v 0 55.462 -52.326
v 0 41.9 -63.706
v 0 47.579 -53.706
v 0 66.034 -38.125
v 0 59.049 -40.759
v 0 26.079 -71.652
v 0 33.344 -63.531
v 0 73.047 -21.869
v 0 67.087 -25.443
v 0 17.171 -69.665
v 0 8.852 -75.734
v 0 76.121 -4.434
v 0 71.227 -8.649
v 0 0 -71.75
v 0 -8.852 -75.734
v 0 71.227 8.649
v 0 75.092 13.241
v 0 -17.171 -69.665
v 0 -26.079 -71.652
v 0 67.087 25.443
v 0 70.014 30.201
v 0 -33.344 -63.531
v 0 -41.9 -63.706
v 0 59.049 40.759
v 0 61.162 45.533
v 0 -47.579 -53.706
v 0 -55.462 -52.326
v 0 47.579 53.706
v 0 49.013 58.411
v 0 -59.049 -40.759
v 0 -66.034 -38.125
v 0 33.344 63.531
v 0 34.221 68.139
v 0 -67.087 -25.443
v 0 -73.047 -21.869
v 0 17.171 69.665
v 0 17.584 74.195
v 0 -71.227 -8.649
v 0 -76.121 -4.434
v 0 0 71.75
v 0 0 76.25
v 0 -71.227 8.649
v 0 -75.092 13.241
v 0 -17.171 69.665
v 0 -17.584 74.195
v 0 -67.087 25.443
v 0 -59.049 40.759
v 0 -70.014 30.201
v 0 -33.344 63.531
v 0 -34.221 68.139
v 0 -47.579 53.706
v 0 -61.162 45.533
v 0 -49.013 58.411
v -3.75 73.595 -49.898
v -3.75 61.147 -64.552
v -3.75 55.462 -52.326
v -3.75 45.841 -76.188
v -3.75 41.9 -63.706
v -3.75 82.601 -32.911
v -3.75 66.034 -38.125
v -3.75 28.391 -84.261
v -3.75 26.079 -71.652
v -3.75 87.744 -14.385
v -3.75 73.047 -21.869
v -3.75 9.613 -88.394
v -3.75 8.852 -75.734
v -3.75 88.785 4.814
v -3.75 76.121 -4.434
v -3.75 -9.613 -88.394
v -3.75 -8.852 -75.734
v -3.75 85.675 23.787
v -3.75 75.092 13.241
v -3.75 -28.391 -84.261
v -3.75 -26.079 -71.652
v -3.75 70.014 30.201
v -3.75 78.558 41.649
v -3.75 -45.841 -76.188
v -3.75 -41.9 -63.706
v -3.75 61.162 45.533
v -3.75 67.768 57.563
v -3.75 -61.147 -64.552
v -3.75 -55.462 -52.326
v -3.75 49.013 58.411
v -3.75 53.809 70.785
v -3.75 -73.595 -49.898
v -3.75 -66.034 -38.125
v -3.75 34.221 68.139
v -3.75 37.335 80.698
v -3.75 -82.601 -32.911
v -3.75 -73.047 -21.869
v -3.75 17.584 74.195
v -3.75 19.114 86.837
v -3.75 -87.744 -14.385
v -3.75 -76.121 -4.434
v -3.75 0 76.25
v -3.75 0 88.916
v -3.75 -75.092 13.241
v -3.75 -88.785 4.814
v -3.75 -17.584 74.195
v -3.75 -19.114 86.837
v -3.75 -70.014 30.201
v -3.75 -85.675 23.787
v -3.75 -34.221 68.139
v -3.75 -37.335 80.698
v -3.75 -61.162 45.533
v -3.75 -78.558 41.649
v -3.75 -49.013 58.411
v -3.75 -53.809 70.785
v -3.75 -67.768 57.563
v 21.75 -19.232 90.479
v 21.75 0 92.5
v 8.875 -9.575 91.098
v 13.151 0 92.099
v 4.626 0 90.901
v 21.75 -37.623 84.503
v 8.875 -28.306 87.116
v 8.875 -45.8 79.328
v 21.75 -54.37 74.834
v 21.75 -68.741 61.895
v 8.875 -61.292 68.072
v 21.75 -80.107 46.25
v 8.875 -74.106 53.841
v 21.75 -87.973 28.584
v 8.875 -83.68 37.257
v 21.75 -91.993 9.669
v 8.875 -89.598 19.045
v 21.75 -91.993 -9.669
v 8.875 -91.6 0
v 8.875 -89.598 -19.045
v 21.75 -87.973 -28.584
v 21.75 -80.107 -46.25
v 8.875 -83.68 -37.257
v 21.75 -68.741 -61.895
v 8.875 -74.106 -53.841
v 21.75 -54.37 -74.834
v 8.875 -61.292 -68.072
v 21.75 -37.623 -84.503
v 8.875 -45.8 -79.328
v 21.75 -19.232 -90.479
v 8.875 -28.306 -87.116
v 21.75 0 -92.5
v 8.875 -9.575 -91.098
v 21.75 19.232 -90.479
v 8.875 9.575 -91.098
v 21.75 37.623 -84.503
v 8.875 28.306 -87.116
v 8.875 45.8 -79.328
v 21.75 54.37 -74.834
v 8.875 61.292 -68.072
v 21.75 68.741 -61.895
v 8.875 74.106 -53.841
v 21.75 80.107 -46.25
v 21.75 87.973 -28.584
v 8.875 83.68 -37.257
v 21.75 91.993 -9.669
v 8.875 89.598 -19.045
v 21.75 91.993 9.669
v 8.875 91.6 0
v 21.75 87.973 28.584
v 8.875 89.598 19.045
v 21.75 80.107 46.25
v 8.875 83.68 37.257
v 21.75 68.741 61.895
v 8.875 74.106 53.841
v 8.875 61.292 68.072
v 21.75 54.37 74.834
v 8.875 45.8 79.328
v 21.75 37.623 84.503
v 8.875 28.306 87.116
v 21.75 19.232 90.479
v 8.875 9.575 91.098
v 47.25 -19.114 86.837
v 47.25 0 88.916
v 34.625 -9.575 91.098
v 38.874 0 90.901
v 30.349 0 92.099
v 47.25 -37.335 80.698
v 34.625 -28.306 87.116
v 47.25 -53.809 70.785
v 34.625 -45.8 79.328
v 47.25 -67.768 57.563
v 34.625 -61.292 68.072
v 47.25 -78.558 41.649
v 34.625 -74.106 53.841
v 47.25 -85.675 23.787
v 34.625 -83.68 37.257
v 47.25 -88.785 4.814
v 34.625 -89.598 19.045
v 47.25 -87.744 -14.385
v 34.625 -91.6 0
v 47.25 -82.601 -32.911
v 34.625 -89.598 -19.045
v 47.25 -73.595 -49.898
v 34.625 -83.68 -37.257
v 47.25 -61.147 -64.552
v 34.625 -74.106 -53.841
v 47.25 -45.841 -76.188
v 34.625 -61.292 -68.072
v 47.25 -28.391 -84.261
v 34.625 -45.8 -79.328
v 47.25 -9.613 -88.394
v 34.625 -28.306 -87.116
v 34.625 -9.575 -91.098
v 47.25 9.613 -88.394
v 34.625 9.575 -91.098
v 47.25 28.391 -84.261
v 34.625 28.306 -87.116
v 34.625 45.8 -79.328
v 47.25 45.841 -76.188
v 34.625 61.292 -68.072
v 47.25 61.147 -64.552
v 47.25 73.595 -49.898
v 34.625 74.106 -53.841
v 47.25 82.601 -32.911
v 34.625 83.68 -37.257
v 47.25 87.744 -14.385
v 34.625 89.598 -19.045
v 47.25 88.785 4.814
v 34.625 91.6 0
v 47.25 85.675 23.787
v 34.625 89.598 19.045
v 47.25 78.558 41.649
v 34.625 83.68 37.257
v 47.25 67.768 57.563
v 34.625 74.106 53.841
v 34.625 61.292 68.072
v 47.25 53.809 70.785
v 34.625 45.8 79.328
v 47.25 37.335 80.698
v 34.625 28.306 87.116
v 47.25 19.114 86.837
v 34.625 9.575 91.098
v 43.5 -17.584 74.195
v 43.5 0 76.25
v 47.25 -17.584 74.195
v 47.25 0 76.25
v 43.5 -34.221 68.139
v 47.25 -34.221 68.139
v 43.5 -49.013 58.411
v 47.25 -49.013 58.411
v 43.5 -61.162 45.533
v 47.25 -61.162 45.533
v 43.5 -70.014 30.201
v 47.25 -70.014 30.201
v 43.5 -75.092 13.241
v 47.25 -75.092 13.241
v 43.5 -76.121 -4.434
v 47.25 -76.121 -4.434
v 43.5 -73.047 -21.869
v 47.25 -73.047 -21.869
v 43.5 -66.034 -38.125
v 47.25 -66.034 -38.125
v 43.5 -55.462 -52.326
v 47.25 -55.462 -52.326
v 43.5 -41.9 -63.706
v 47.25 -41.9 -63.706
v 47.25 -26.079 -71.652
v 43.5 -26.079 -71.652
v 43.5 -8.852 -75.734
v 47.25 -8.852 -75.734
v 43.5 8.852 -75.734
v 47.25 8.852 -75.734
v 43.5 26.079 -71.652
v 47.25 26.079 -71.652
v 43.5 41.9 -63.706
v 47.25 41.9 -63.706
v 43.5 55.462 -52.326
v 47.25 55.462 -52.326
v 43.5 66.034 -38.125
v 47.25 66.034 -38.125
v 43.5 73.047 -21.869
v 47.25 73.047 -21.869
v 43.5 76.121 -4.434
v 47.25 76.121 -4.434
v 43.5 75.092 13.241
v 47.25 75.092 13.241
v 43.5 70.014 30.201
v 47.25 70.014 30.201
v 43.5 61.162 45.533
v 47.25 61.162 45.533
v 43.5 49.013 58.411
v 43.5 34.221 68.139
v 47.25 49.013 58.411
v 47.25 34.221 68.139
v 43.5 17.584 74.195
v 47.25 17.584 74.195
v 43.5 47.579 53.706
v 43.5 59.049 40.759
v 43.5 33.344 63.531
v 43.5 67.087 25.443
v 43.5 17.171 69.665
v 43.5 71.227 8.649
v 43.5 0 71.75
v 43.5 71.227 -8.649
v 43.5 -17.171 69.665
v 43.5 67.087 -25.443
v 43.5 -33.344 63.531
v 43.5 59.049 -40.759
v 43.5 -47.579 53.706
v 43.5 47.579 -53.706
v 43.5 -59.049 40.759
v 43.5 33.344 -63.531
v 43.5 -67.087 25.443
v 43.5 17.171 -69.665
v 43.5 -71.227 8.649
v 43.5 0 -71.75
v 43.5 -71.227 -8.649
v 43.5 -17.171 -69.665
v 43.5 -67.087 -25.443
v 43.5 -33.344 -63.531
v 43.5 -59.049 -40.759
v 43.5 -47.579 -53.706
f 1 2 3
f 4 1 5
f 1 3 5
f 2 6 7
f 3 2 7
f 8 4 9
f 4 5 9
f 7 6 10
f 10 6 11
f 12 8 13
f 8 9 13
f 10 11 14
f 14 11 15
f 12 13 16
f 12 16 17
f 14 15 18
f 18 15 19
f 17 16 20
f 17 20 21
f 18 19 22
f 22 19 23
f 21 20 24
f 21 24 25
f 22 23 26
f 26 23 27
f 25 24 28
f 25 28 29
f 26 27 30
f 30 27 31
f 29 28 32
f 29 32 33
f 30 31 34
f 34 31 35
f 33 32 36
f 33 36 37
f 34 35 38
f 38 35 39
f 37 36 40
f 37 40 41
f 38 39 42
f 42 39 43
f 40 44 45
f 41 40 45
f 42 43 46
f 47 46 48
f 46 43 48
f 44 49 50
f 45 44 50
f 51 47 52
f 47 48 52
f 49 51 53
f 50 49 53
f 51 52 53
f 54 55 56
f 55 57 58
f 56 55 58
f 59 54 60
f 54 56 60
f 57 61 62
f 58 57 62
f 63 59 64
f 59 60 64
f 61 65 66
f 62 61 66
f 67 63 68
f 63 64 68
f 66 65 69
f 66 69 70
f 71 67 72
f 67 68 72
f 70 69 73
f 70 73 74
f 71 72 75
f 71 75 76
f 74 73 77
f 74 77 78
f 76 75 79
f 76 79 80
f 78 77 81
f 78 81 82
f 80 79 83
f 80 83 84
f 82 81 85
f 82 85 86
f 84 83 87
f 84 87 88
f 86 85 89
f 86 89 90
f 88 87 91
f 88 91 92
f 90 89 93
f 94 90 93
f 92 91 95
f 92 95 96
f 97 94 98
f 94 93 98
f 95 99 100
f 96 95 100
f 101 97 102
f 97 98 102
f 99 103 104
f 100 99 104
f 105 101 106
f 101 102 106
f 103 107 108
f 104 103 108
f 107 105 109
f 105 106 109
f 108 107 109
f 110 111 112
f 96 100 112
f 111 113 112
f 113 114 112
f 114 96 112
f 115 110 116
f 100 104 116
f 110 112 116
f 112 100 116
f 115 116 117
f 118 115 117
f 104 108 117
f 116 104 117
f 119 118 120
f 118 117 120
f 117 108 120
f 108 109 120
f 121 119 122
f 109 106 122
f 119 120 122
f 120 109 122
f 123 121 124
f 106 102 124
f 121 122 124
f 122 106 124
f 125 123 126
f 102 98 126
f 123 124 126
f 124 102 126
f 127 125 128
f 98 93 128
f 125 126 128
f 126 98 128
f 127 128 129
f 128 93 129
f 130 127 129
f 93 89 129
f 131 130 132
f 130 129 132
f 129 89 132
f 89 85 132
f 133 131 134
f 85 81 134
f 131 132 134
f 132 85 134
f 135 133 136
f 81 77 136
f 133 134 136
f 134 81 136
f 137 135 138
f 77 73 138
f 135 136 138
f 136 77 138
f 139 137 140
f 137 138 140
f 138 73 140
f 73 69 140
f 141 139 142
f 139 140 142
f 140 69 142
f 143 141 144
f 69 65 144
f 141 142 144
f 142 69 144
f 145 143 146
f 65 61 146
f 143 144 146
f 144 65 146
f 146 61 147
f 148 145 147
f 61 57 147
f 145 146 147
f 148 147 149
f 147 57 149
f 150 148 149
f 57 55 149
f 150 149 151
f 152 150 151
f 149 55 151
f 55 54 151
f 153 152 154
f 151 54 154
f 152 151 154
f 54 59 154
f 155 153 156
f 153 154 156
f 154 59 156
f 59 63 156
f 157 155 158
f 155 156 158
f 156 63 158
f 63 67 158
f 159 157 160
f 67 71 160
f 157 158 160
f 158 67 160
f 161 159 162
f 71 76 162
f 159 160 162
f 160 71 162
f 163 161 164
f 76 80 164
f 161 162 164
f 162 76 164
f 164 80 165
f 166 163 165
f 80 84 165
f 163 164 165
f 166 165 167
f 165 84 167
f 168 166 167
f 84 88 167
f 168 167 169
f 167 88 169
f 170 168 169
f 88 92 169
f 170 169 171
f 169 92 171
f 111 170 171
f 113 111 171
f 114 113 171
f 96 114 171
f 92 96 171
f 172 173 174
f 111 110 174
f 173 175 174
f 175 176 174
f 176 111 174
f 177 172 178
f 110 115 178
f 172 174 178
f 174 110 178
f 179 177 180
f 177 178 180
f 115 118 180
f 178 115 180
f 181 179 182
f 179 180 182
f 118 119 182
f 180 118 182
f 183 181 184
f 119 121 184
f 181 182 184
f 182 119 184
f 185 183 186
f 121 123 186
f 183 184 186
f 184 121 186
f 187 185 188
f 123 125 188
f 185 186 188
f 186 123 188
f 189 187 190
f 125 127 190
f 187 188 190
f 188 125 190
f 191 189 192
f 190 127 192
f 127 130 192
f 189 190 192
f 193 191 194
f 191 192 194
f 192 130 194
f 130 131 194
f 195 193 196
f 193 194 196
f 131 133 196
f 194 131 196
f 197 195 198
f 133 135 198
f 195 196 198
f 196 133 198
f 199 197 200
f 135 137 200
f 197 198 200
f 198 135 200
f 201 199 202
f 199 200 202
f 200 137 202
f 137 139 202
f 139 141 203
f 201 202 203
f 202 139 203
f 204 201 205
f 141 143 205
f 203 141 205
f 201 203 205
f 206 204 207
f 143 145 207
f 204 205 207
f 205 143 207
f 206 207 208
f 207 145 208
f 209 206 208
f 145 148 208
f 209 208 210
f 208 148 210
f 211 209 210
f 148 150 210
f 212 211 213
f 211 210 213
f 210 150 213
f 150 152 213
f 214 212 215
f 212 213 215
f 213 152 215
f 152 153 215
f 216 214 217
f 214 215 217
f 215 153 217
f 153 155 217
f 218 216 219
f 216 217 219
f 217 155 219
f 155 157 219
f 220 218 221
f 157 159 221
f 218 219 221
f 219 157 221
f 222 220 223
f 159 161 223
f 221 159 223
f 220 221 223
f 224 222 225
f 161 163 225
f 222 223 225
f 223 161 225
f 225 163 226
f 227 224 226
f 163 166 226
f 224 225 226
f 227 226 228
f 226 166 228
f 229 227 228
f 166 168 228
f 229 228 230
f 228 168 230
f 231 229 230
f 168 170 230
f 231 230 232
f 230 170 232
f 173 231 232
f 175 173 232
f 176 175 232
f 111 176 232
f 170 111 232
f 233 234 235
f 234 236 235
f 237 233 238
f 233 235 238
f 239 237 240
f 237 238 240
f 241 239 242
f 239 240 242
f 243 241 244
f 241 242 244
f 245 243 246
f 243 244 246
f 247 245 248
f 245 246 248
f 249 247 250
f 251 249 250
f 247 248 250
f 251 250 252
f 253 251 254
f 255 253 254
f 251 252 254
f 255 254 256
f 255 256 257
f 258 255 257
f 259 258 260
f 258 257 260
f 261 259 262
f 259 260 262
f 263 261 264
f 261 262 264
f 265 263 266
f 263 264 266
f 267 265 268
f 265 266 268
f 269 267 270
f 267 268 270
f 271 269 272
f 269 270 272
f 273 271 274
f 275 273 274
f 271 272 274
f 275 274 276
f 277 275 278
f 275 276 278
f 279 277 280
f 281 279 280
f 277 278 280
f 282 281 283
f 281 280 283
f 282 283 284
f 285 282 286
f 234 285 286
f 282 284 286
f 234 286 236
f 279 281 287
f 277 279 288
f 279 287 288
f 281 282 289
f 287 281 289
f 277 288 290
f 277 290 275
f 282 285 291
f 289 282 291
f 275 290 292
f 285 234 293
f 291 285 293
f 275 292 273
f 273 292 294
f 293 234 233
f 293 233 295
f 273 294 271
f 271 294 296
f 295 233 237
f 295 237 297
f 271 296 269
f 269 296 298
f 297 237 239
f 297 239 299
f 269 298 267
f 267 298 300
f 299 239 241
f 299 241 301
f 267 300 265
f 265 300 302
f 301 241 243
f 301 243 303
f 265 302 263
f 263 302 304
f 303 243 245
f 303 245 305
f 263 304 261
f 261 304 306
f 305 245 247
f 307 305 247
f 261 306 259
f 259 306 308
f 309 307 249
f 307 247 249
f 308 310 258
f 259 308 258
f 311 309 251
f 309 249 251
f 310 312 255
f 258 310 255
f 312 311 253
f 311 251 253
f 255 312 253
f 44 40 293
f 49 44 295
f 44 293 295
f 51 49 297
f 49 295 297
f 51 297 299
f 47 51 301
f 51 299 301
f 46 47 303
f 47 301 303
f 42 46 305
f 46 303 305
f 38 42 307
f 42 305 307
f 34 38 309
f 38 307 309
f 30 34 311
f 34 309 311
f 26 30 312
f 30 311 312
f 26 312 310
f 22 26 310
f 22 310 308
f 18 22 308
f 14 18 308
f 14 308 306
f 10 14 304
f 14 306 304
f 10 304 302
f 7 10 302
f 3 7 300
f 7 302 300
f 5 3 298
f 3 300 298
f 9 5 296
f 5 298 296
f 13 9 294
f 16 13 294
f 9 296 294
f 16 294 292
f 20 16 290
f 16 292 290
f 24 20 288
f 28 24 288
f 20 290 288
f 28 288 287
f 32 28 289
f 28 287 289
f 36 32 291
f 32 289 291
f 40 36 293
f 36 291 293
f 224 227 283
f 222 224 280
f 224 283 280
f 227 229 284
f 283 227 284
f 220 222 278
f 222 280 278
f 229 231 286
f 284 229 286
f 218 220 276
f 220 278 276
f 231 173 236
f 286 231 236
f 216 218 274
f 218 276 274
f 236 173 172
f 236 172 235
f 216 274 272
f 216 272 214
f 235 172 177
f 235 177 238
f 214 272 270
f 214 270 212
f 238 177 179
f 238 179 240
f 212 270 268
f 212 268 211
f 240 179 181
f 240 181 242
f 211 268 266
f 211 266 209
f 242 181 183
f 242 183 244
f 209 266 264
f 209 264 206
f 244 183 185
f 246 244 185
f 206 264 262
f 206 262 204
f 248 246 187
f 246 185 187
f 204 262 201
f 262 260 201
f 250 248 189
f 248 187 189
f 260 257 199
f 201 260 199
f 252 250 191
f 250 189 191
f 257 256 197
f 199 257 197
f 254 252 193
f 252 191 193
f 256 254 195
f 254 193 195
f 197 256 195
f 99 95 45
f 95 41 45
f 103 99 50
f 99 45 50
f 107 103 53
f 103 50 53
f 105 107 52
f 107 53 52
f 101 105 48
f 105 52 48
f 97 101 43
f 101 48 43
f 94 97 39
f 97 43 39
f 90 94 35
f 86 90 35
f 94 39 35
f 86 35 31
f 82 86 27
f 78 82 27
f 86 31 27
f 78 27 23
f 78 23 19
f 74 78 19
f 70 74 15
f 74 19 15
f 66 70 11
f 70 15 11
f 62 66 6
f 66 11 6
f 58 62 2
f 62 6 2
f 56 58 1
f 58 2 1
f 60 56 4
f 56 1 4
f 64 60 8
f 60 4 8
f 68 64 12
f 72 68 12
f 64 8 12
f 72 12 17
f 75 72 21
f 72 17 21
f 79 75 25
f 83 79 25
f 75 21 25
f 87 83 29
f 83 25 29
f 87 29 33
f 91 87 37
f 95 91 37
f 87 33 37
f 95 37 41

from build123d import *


with BuildPart() as part:
    # 草图1 → 旋转1 (revolve)
    with BuildSketch(Plane.XY, mode=Mode.PRIVATE) as revolve_1_sk:
        with BuildLine():
            Line((0, 76.25), (0, 71.75))
            Line((0, 71.75), (43.5, 71.75))
            Line((43.5, 71.75), (43.5, 76.25))
            Line((43.5, 76.25), (47.25, 76.25))
            Line((47.25, 76.25), (47.25, 88.915690404))
            ThreePointArc((47.25, 88.915690404), (34.625338065, 91.599539681), (21.7500009, 92.5))
            ThreePointArc((21.7500009, 92.5), (8.874662826, 91.599539806), (-3.75, 88.915690404))
            Line((-3.75, 88.915690404), (-3.75, 76.25))
            Line((-3.75, 76.25), (0, 76.25))
        make_face()
    revolve(revolve_1_sk.sketch.rotate(Axis((0, 0, 0), (1, 0, 0)), 90), axis=Axis((0, 0, 0), (1, 0, 0)))


solid = part.part
